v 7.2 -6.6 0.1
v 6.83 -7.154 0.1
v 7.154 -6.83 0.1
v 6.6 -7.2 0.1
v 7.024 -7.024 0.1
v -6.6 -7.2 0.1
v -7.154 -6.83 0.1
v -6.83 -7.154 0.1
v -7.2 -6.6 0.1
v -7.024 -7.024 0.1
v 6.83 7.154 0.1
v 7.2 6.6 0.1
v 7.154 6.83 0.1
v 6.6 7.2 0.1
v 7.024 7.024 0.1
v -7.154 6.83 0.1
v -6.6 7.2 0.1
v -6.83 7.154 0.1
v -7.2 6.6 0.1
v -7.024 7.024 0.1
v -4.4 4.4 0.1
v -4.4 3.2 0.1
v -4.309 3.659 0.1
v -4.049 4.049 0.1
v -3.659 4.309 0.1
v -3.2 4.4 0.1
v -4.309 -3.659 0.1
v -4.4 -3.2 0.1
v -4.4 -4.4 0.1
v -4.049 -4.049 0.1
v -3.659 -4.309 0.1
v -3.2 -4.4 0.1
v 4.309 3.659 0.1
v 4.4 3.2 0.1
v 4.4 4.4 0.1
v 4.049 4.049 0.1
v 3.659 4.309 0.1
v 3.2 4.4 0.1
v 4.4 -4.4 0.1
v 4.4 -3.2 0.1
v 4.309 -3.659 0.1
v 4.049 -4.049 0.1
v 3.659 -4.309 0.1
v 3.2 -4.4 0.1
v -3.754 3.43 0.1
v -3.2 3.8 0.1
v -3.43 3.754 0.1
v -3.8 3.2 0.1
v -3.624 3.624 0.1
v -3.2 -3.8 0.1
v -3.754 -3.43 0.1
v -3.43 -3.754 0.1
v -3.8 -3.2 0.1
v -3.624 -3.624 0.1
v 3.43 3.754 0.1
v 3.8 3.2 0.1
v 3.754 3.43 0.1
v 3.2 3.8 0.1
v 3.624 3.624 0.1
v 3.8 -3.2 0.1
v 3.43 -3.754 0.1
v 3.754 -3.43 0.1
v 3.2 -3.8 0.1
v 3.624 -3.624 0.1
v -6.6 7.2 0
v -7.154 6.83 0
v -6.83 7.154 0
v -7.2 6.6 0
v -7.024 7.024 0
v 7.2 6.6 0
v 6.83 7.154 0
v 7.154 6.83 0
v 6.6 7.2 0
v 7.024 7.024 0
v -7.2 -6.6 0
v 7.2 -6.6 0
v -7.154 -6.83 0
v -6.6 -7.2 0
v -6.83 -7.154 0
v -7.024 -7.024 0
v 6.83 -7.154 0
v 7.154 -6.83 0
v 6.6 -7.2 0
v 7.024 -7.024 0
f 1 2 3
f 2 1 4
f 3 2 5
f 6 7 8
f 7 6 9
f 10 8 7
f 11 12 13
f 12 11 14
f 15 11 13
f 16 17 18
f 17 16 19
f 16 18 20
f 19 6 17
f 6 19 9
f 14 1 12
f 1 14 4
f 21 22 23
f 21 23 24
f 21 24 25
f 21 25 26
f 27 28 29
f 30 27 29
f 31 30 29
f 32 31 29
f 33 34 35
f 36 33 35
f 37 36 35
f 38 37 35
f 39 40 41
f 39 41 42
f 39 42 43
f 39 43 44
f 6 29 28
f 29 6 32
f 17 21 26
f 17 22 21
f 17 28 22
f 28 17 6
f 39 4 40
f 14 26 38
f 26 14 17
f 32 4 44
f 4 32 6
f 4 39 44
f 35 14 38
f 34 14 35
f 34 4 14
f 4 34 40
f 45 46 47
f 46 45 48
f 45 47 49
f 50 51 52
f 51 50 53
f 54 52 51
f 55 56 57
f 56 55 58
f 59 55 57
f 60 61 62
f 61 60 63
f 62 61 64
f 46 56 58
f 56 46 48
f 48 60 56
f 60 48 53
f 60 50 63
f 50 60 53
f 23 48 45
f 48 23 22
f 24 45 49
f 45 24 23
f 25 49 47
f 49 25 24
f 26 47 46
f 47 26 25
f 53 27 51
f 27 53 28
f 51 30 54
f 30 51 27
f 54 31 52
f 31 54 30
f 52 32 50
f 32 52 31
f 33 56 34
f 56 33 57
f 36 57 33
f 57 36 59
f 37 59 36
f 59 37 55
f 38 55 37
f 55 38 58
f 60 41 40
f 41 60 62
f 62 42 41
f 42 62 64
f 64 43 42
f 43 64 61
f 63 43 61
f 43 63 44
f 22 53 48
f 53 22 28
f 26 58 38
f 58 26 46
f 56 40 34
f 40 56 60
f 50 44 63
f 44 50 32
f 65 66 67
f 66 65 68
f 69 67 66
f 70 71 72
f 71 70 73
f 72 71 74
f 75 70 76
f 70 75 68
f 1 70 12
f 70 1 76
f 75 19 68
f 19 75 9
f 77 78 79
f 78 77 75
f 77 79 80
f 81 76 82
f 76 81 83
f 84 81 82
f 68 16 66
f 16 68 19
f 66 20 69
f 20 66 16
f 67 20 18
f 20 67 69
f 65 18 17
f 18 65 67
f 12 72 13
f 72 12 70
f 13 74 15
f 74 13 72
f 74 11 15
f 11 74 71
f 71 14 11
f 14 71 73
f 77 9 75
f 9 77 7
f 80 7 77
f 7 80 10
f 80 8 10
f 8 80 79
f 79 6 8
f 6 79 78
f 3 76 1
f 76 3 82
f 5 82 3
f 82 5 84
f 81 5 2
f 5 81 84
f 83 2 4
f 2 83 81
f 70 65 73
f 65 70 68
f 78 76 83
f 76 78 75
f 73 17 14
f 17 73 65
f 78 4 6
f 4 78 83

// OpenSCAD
// file: ../p/box3u12.scad
use <../lib.scad>
function ldraw_lib__box3u12() = [
// 0 Box with 3 Parallel Faces without Any Edges
// 0 Name: box3u12.dat
// 0 Author: J.C. Tchang [tchang]
// 0 !LDRAW_ORG Primitive UPDATE 2014-02
// 0 !LICENSE Licensed under CC BY 4.0 : see CAreadme.txt
// 
// 0 BFC CERTIFY CCW
  [0,"BFC","CERTIFY"],
  [0,"BFC","CCW"],
// 
// 0 !HISTORY 2014-12-23 [PTadmin] Official Update 2014-02
// 
// 
// 4 16 -1 1 1 1 1 1 1 1 -1 -1 1 -1
  [4,16,-1,1,1,1,1,1,1,1,-1,-1,1,-1],
// 4 16 -1 1 1 -1 0 1 1 0 1 1 1 1
  [4,16,-1,1,1,-1,0,1,1,0,1,1,1,1],
// 4 16 1 1 -1 1 0 -1 -1 0 -1 -1 1 -1
  [4,16,1,1,-1,1,0,-1,-1,0,-1,-1,1,-1],
];
module ldraw_lib__box3u12(step=0, col=false, unit=2/5, alt=false, line=0.2, solid=!$preview)
    makepoly(ldraw_lib__box3u12(), step=step, col=col, unit=unit, alt=alt, line=line, solid=solid);
ldraw_lib__box3u12(line=0.2);
// file: ../p/1-4cyli.scad
use <../lib.scad>
function ldraw_lib__1_4cyli() = [
// 0 Cylinder 0.25
// 0 Name: 1-4cyli.dat
// 0 Author: James Jessiman
// 0 !LDRAW_ORG Primitive UPDATE 2012-01
// 0 !LICENSE Licensed under CC BY 4.0 : see CAreadme.txt
// 
// 0 BFC CERTIFY CCW
  [0,"BFC","CERTIFY"],
  [0,"BFC","CCW"],
// 
// 0 !HISTORY 2002-03-23 [sbliss] Added BFC statement.
// 0 !HISTORY 2002-04-25 [PTadmin] Official Update 2002-02
// 0 !HISTORY 2007-06-22 [PTadmin] Header formatted for Contributor Agreement
// 0 !HISTORY 2008-07-01 [PTadmin] Official Update 2008-01
// 0 !HISTORY 2012-02-16 [Philo] Changed to CCW
// 0 !HISTORY 2012-03-30 [PTadmin] Official Update 2012-01
// 
// 
// 4 16 1 1 0 0.9239 1 0.3827 0.9239 0 0.3827 1 0 0
  [4,16,1,1,0,0.9239,1,0.3827,0.9239,0,0.3827,1,0,0],
// 5 24 1 0 0 1 1 0 0.9239 0 0.3827 1 0 -1
  [5,24,1,0,0,1,1,0,0.9239,0,0.3827,1,0,-1],
// 4 16 0.9239 1 0.3827 0.7071 1 0.7071 0.7071 0 0.7071 0.9239 0 0.3827
  [4,16,0.9239,1,0.3827,0.7071,1,0.7071,0.7071,0,0.7071,0.9239,0,0.3827],
// 5 24 0.9239 0 0.3827 0.9239 1 0.3827 0.7071 0 0.7071 1 0 0
  [5,24,0.9239,0,0.3827,0.9239,1,0.3827,0.7071,0,0.7071,1,0,0],
// 4 16 0.7071 1 0.7071 0.3827 1 0.9239 0.3827 0 0.9239 0.7071 0 0.7071
  [4,16,0.7071,1,0.7071,0.3827,1,0.9239,0.3827,0,0.9239,0.7071,0,0.7071],
// 5 24 0.7071 0 0.7071 0.7071 1 0.7071 0.3827 0 0.9239 0.9239 0 0.3827
  [5,24,0.7071,0,0.7071,0.7071,1,0.7071,0.3827,0,0.9239,0.9239,0,0.3827],
// 4 16 0.3827 1 0.9239 0 1 1 0 0 1 0.3827 0 0.9239
  [4,16,0.3827,1,0.9239,0,1,1,0,0,1,0.3827,0,0.9239],
// 5 24 0.3827 0 0.9239 0.3827 1 0.9239 0 0 1 0.7071 0 0.7071
  [5,24,0.3827,0,0.9239,0.3827,1,0.9239,0,0,1,0.7071,0,0.7071],
// 5 24 0 0 1 0 1 1 0.3827 0 0.9239 -1 0 1
  [5,24,0,0,1,0,1,1,0.3827,0,0.9239,-1,0,1],
];
module ldraw_lib__1_4cyli(step=0, col=false, unit=2/5, alt=false, line=0.2, solid=!$preview)
    makepoly(ldraw_lib__1_4cyli(), step=step, col=col, unit=unit, alt=alt, line=line, solid=solid);
ldraw_lib__1_4cyli(line=0.2);
// file: ../p/1-4ring1.scad
use <../lib.scad>
function ldraw_lib__1_4ring1() = [
// 0 Ring  1 x 0.25
// 0 Name: 1-4ring1.dat
// 0 Author: Chris Dee [cwdee]
// 0 !LDRAW_ORG Primitive UPDATE 2012-01
// 0 !LICENSE Licensed under CC BY 4.0 : see CAreadme.txt
// 
// 0 BFC CERTIFY CCW
  [0,"BFC","CERTIFY"],
  [0,"BFC","CCW"],
// 
// 0 !HISTORY 2000-05-07 [PTadmin] Official Update 2000-01
// 0 !HISTORY 2002-11-22 [hafhead] Added BFC statement
// 0 !HISTORY 2002-11-30 [PTadmin] Official Update 2002-05
// 0 !HISTORY 2007-06-22 [PTadmin] Header formatted for Contributor Agreement
// 0 !HISTORY 2008-07-01 [PTadmin] Official Update 2008-01
// 0 !HISTORY 2012-02-16 [Philo] Changed to CCW
// 0 !HISTORY 2012-03-30 [PTadmin] Official Update 2012-01
// 
// 
// 4 16 2 0 0 1.8478 0 0.7654 0.9239 0 0.3827 1 0 0
  [4,16,2,0,0,1.8478,0,0.7654,0.9239,0,0.3827,1,0,0],
// 4 16 1.8478 0 0.7654 1.4142 0 1.4142 0.7071 0 0.7071 0.9239 0 0.3827
  [4,16,1.8478,0,0.7654,1.4142,0,1.4142,0.7071,0,0.7071,0.9239,0,0.3827],
// 4 16 1.4142 0 1.4142 0.7654 0 1.8478 0.3827 0 0.9239 0.7071 0 0.7071
  [4,16,1.4142,0,1.4142,0.7654,0,1.8478,0.3827,0,0.9239,0.7071,0,0.7071],
// 4 16 0.7654 0 1.8478 0 0 2 0 0 1 0.3827 0 0.9239
  [4,16,0.7654,0,1.8478,0,0,2,0,0,1,0.3827,0,0.9239],
];
module ldraw_lib__1_4ring1(step=0, col=false, unit=2/5, alt=false, line=0.2, solid=!$preview)
    makepoly(ldraw_lib__1_4ring1(), step=step, col=col, unit=unit, alt=alt, line=line, solid=solid);
ldraw_lib__1_4ring1(line=0.2);
// file: ../p/1-4ndis.scad
use <../lib.scad>
function ldraw_lib__1_4ndis() = [
// 0 Disc Negative 0.25
// 0 Name: 1-4ndis.dat
// 0 Author: James Jessiman
// 0 !LDRAW_ORG Primitive UPDATE 2012-01
// 0 !LICENSE Licensed under CC BY 4.0 : see CAreadme.txt
// 
// 0 BFC CERTIFY CCW
  [0,"BFC","CERTIFY"],
  [0,"BFC","CCW"],
// 
// 0 !HISTORY 2002-03-23 [sbliss] Added BFC Statement
// 0 !HISTORY 2002-04-25 [PTadmin] Official Update 2002-02
// 0 !HISTORY 2007-06-22 [PTadmin] Header formatted for Contributor Agreement
// 0 !HISTORY 2008-07-01 [PTadmin] Official Update 2008-01
// 0 !HISTORY 2012-02-16 [Philo] Changed to CCW
// 0 !HISTORY 2012-03-30 [PTadmin] Official Update 2012-01
// 
// 
// 3 16 0.9239 0 0.3827 1 0 0 1 0 1
  [3,16,0.9239,0,0.3827,1,0,0,1,0,1],
// 3 16 0.7071 0 0.7071 0.9239 0 0.3827 1 0 1
  [3,16,0.7071,0,0.7071,0.9239,0,0.3827,1,0,1],
// 3 16 0.3827 0 0.9239 0.7071 0 0.7071 1 0 1
  [3,16,0.3827,0,0.9239,0.7071,0,0.7071,1,0,1],
// 3 16 0 0 1 0.3827 0 0.9239 1 0 1
  [3,16,0,0,1,0.3827,0,0.9239,1,0,1],
];
module ldraw_lib__1_4ndis(step=0, col=false, unit=2/5, alt=false, line=0.2, solid=!$preview)
    makepoly(ldraw_lib__1_4ndis(), step=step, col=col, unit=unit, alt=alt, line=line, solid=solid);
ldraw_lib__1_4ndis(line=0.2);
// file: ../p/1-4chrd.scad
use <../lib.scad>
function ldraw_lib__1_4chrd() = [
// 0 Chord 0.25
// 0 Name: 1-4chrd.dat
// 0 Author: Max Martin Richter [MMR1988]
// 0 !LDRAW_ORG Primitive UPDATE 2023-05
// 0 !LICENSE Licensed under CC BY 4.0 : see CAreadme.txt
// 
// 0 BFC CERTIFY CCW
  [0,"BFC","CERTIFY"],
  [0,"BFC","CCW"],
// 
// 0 !HISTORY 2004-04-22 [PTadmin] Official Update 2004-02
// 0 !HISTORY 2007-10-09 [PTadmin] Header formatted for Contributor Agreement
// 0 !HISTORY 2008-07-01 [PTadmin] Official Update 2008-01
// 0 !HISTORY 2012-08-02 [MMR1988] Re-creation with PrimGen2 and Rectifier
// 0 !HISTORY 2012-08-09 [PTadmin] Official Update 2012-02
// 0 !HISTORY 2023-10-27 [OrionP] Change author to MMR1988 from hafhead
// 0 !HISTORY 2023-10-31 [OrionP] Official Update 2023-05
// 
// 4 16 0.9239 0 0.3827 0.3827 0 0.9239 0 0 1 1 0 0
  [4,16,0.9239,0,0.3827,0.3827,0,0.9239,0,0,1,1,0,0],
// 3 16 0.7071 0 0.7071 0.3827 0 0.9239 0.9239 0 0.3827
  [3,16,0.7071,0,0.7071,0.3827,0,0.9239,0.9239,0,0.3827],
];
module ldraw_lib__1_4chrd(step=0, col=false, unit=2/5, alt=false, line=0.2, solid=!$preview)
    makepoly(ldraw_lib__1_4chrd(), step=step, col=col, unit=unit, alt=alt, line=line, solid=solid);
ldraw_lib__1_4chrd(line=0.2);
// file: s/stickerback018x018.scad
use <../../lib.scad>
use <../../p/1-4chrd.scad>
use <../../p/1-4cyli.scad>
use <../../p/box3u12.scad>
function ldraw_lib__s__stickerback018x018() = [
// 0 ~Sticker Back  1.8 x  1.8
// 0 Name: s\stickerback018x018.dat
// 0 Author: Massimo Maso [Sirio]
// 0 !LDRAW_ORG Subpart UPDATE 2025-08
// 0 !LICENSE Licensed under CC BY 4.0 : see CAreadme.txt
// 
// 0 BFC CERTIFY CCW
  [0,"BFC","CERTIFY"],
  [0,"BFC","CCW"],
// 
// 0 !HISTORY 2025-08-31 [OrionP] Official Update 2025-08
// 
// 0 // Primitives
// 1 16 -16.5 0 16.5 -1.5 0 0 0 -1 0 0 0 1.5 1-4chrd.dat
  [1,16,-16.5,0,16.5,-1.5,0,0,0,-1,0,0,0,1.5, ldraw_lib__1_4chrd()],
// 1 16 16.5 0 16.5 1.5 0 0 0 -1 0 0 0 1.5 1-4chrd.dat
  [1,16,16.5,0,16.5,1.5,0,0,0,-1,0,0,0,1.5, ldraw_lib__1_4chrd()],
// 1 16 0 -.25 0 0 0 18 0 .25 0 16.5 0 0 box3u12.dat
  [1,16,0,-.25,0,0,0,18,0,.25,0,16.5,0,0, ldraw_lib__box3u12()],
// 1 16 -16.5 0 -16.5 -1.5 0 0 0 -1 0 0 0 -1.5 1-4chrd.dat
  [1,16,-16.5,0,-16.5,-1.5,0,0,0,-1,0,0,0,-1.5, ldraw_lib__1_4chrd()],
// 1 16 16.5 0 -16.5 1.5 0 0 0 -1 0 0 0 -1.5 1-4chrd.dat
  [1,16,16.5,0,-16.5,1.5,0,0,0,-1,0,0,0,-1.5, ldraw_lib__1_4chrd()],
// 1 16 -16.5 -.25 16.5 -1.5 0 0 0 .25 0 0 0 1.5 1-4cyli.dat
  [1,16,-16.5,-.25,16.5,-1.5,0,0,0,.25,0,0,0,1.5, ldraw_lib__1_4cyli()],
// 1 16 16.5 -.25 16.5 1.5 0 0 0 .25 0 0 0 1.5 1-4cyli.dat
  [1,16,16.5,-.25,16.5,1.5,0,0,0,.25,0,0,0,1.5, ldraw_lib__1_4cyli()],
// 1 16 -16.5 -.25 -16.5 -1.5 0 0 0 .25 0 0 0 -1.5 1-4cyli.dat
  [1,16,-16.5,-.25,-16.5,-1.5,0,0,0,.25,0,0,0,-1.5, ldraw_lib__1_4cyli()],
// 1 16 16.5 -.25 -16.5 1.5 0 0 0 .25 0 0 0 -1.5 1-4cyli.dat
  [1,16,16.5,-.25,-16.5,1.5,0,0,0,.25,0,0,0,-1.5, ldraw_lib__1_4cyli()],
// 0 // Bottom face
// 4 16 -16.5 0 18 16.5 0 18 18 0 16.5 -18 0 16.5
  [4,16,-16.5,0,18,16.5,0,18,18,0,16.5,-18,0,16.5],
// 4 16 -16.5 0 -18 -18 0 -16.5 18 0 -16.5 16.5 0 -18
  [4,16,-16.5,0,-18,-18,0,-16.5,18,0,-16.5,16.5,0,-18],
// 0 // Lateral face
// 4 16 -16.5 -.25 18 16.5 -.25 18 16.5 0 18 -16.5 0 18
  [4,16,-16.5,-.25,18,16.5,-.25,18,16.5,0,18,-16.5,0,18],
// 4 16 16.5 0 -18 16.5 -.25 -18 -16.5 -.25 -18 -16.5 0 -18
  [4,16,16.5,0,-18,16.5,-.25,-18,-16.5,-.25,-18,-16.5,0,-18],
];
module ldraw_lib__s__stickerback018x018(step=0, col=false, unit=2/5, alt=false, line=0.2, solid=!$preview)
    makepoly(ldraw_lib__s__stickerback018x018(), step=step, col=col, unit=unit, alt=alt, line=line, solid=solid);
ldraw_lib__s__stickerback018x018(line=0.2);
// file: s/6227186fs01.scad
use <../../lib.scad>
use <../../p/1-4chrd.scad>
use <../../p/1-4ndis.scad>
use <../../p/1-4ring1.scad>
function ldraw_lib__s__6227186fs01() = [
// 0 ~Sticker  1.8 x  1.8 with Green Rounded Square with Black Outline - Top Surface
// 0 Name: s\6227186fs01.dat
// 0 Author: Gerald Lasser [GeraldLasser]
// 0 !LDRAW_ORG Subpart UPDATE 2026-05
// 0 !LICENSE Licensed under CC BY 4.0 : see CAreadme.txt
// 
// 0 BFC CERTIFY CCW
  [0,"BFC","CERTIFY"],
  [0,"BFC","CCW"],
// 
// 0 !HISTORY 2026-05-31 [OrionP] Official Update 2026-05
// 
// 1 16 16.5 -.25 -16.5 1.5 0 0 0 1 0 0 0 -1.5 1-4chrd.dat
  [1,16,16.5,-.25,-16.5,1.5,0,0,0,1,0,0,0,-1.5, ldraw_lib__1_4chrd()],
// 1 16 -16.5 -.25 -16.5 -1.5 0 0 0 1 0 0 0 -1.5 1-4chrd.dat
  [1,16,-16.5,-.25,-16.5,-1.5,0,0,0,1,0,0,0,-1.5, ldraw_lib__1_4chrd()],
// 1 16 16.5 -.25 16.5 1.5 0 0 0 1 0 0 0 1.5 1-4chrd.dat
  [1,16,16.5,-.25,16.5,1.5,0,0,0,1,0,0,0,1.5, ldraw_lib__1_4chrd()],
// 1 16 -16.5 -.25 16.5 -1.5 0 0 0 1 0 0 0 1.5 1-4chrd.dat
  [1,16,-16.5,-.25,16.5,-1.5,0,0,0,1,0,0,0,1.5, ldraw_lib__1_4chrd()],
// 
// 4 16 -16.5 -.25 18 -18 -.25 16.5 -18 -.25 -16.5 -16.5 -.25 -18
  [4,16,-16.5,-.25,18,-18,-.25,16.5,-18,-.25,-16.5,-16.5,-.25,-18],
// 4 16 16.5 -.25 18 16.5 -.25 -18 18 -.25 -16.5 18 -.25 16.5
  [4,16,16.5,-.25,18,16.5,-.25,-18,18,-.25,-16.5,18,-.25,16.5],
// 
// 1 16 -8 -.25 8 -3 0 0 0 1 0 0 0 3 1-4ndis.dat
  [1,16,-8,-.25,8,-3,0,0,0,1,0,0,0,3, ldraw_lib__1_4ndis()],
// 1 16 -8 -.25 -8 -3 0 0 0 1 0 0 0 -3 1-4ndis.dat
  [1,16,-8,-.25,-8,-3,0,0,0,1,0,0,0,-3, ldraw_lib__1_4ndis()],
// 1 16 8 -.25 8 3 0 0 0 1 0 0 0 3 1-4ndis.dat
  [1,16,8,-.25,8,3,0,0,0,1,0,0,0,3, ldraw_lib__1_4ndis()],
// 1 16 8 -.25 -8 3 0 0 0 1 0 0 0 -3 1-4ndis.dat
  [1,16,8,-.25,-8,3,0,0,0,1,0,0,0,-3, ldraw_lib__1_4ndis()],
// 3 16 -16.5 -.25 -18 -11 -.25 -11 -11 -.25 -8
  [3,16,-16.5,-.25,-18,-11,-.25,-11,-11,-.25,-8],
// 3 16 -11 -.25 -11 -16.5 -.25 -18 -8 -.25 -11
  [3,16,-11,-.25,-11,-16.5,-.25,-18,-8,-.25,-11],
// 3 16 -16.5 -.25 18 -11 -.25 11 -8 -.25 11
  [3,16,-16.5,-.25,18,-11,-.25,11,-8,-.25,11],
// 3 16 -16.5 -.25 18 -11 -.25 8 -11 -.25 11
  [3,16,-16.5,-.25,18,-11,-.25,8,-11,-.25,11],
// 4 16 -11 -.25 -8 -11 -.25 8 -16.5 -.25 18 -16.5 -.25 -18
  [4,16,-11,-.25,-8,-11,-.25,8,-16.5,-.25,18,-16.5,-.25,-18],
// 3 16 11 -.25 -11 16.5 -.25 -18 11 -.25 -8
  [3,16,11,-.25,-11,16.5,-.25,-18,11,-.25,-8],
// 4 16 -16.5 -.25 18 -8 -.25 11 8 -.25 11 16.5 -.25 18
  [4,16,-16.5,-.25,18,-8,-.25,11,8,-.25,11,16.5,-.25,18],
// 4 16 8 -.25 -11 -8 -.25 -11 -16.5 -.25 -18 16.5 -.25 -18
  [4,16,8,-.25,-11,-8,-.25,-11,-16.5,-.25,-18,16.5,-.25,-18],
// 3 16 16.5 -.25 -18 11 -.25 -11 8 -.25 -11
  [3,16,16.5,-.25,-18,11,-.25,-11,8,-.25,-11],
// 3 16 11 -.25 11 16.5 -.25 18 8 -.25 11
  [3,16,11,-.25,11,16.5,-.25,18,8,-.25,11],
// 3 16 11 -.25 8 16.5 -.25 18 11 -.25 11
  [3,16,11,-.25,8,16.5,-.25,18,11,-.25,11],
// 4 16 16.5 -.25 18 11 -.25 8 11 -.25 -8 16.5 -.25 -18
  [4,16,16.5,-.25,18,11,-.25,8,11,-.25,-8,16.5,-.25,-18],
// 
// 0 BFC NOCLIP
  [0,"BFC","NOCLIP"],
// 1 2 -8 -.25 8 -1.5 0 0 0 1 0 0 0 1.5 1-4chrd.dat
  [1,2,-8,-.25,8,-1.5,0,0,0,1,0,0,0,1.5, ldraw_lib__1_4chrd()],
// 1 2 -8 -.25 -8 -1.5 0 0 0 1 0 0 0 -1.5 1-4chrd.dat
  [1,2,-8,-.25,-8,-1.5,0,0,0,1,0,0,0,-1.5, ldraw_lib__1_4chrd()],
// 1 2 8 -.25 8 1.5 0 0 0 1 0 0 0 1.5 1-4chrd.dat
  [1,2,8,-.25,8,1.5,0,0,0,1,0,0,0,1.5, ldraw_lib__1_4chrd()],
// 1 2 8 -.25 -8 1.5 0 0 0 1 0 0 0 -1.5 1-4chrd.dat
  [1,2,8,-.25,-8,1.5,0,0,0,1,0,0,0,-1.5, ldraw_lib__1_4chrd()],
// 4 2 8 -.25 9.5 -8 -.25 9.5 -9.5 -.25 8 9.5 -.25 8
  [4,2,8,-.25,9.5,-8,-.25,9.5,-9.5,-.25,8,9.5,-.25,8],
// 4 2 9.5 -.25 -8 9.5 -.25 8 -9.5 -.25 8 -9.5 -.25 -8
  [4,2,9.5,-.25,-8,9.5,-.25,8,-9.5,-.25,8,-9.5,-.25,-8],
// 4 2 9.5 -.25 -8 -9.5 -.25 -8 -8 -.25 -9.5 8 -.25 -9.5
  [4,2,9.5,-.25,-8,-9.5,-.25,-8,-8,-.25,-9.5,8,-.25,-9.5],
// 
// 1 0 -8 -.25 8 -1.5 0 0 0 1 0 0 0 1.5 1-4ring1.dat
  [1,0,-8,-.25,8,-1.5,0,0,0,1,0,0,0,1.5, ldraw_lib__1_4ring1()],
// 1 0 -8 -.25 -8 -1.5 0 0 0 1 0 0 0 -1.5 1-4ring1.dat
  [1,0,-8,-.25,-8,-1.5,0,0,0,1,0,0,0,-1.5, ldraw_lib__1_4ring1()],
// 1 0 8 -.25 8 1.5 0 0 0 1 0 0 0 1.5 1-4ring1.dat
  [1,0,8,-.25,8,1.5,0,0,0,1,0,0,0,1.5, ldraw_lib__1_4ring1()],
// 1 0 8 -.25 -8 1.5 0 0 0 1 0 0 0 -1.5 1-4ring1.dat
  [1,0,8,-.25,-8,1.5,0,0,0,1,0,0,0,-1.5, ldraw_lib__1_4ring1()],
// 4 0 -9.5 -.25 -8 -9.5 -.25 8 -11 -.25 8 -11 -.25 -8
  [4,0,-9.5,-.25,-8,-9.5,-.25,8,-11,-.25,8,-11,-.25,-8],
// 4 0 -8 -.25 11 -8 -.25 9.5 8 -.25 9.5 8 -.25 11
  [4,0,-8,-.25,11,-8,-.25,9.5,8,-.25,9.5,8,-.25,11],
// 4 0 11 -.25 8 9.5 -.25 8 9.5 -.25 -8 11 -.25 -8
  [4,0,11,-.25,8,9.5,-.25,8,9.5,-.25,-8,11,-.25,-8],
// 4 0 -8 -.25 -9.5 -8 -.25 -11 8 -.25 -11 8 -.25 -9.5
  [4,0,-8,-.25,-9.5,-8,-.25,-11,8,-.25,-11,8,-.25,-9.5],
];
module ldraw_lib__s__6227186fs01(step=0, col=false, unit=2/5, alt=false, line=0.2, solid=!$preview)
    makepoly(ldraw_lib__s__6227186fs01(), step=step, col=col, unit=unit, alt=alt, line=line, solid=solid);
ldraw_lib__s__6227186fs01(line=0.2);
// main file
use <../lib.scad>
use <s/6227186fs01.scad>
use <s/stickerback018x018.scad>
function ldraw_lib__6227151n() = [
// 0 Sticker  1.8 x  1.8 with Green Rounded Square with Black Outline on Dark Bluish Grey Background
// 0 Name: 6227151n.dat
// 0 Author: Gerald Lasser [GeraldLasser]
// 0 !LDRAW_ORG Part UPDATE 2026-05
// 0 !LICENSE Licensed under CC BY 4.0 : see CAreadme.txt
// 
// 0 BFC CERTIFY CCW
  [0,"BFC","CERTIFY"],
  [0,"BFC","CCW"],
// 
// 0 !KEYWORDS BrickLink 60198stk01, Brickowl 493874, On-Button, Rebrickable 38749
// 0 !KEYWORDS Set 60197, Train
// 
// 0 !HISTORY 2026-05-31 [OrionP] Official Update 2026-05
// 
// 1 72 0 0 0 1 0 0 0 1 0 0 0 1 s\6227186fs01.dat
  [1,72,0,0,0,1,0,0,0,1,0,0,0,1, ldraw_lib__s__6227186fs01()],
// 
// 1 16 0 0 0 1 0 0 0 1 0 0 0 1 s\stickerback018x018.dat
  [1,16,0,0,0,1,0,0,0,1,0,0,0,1, ldraw_lib__s__stickerback018x018()],
];
module ldraw_lib__6227151n(step=0, col=false, unit=2/5, alt=false, line=0.2, solid=!$preview)
    makepoly(ldraw_lib__6227151n(), step=step, col=col, unit=unit, alt=alt, line=line, solid=solid);
ldraw_lib__6227151n(line=0.2);
